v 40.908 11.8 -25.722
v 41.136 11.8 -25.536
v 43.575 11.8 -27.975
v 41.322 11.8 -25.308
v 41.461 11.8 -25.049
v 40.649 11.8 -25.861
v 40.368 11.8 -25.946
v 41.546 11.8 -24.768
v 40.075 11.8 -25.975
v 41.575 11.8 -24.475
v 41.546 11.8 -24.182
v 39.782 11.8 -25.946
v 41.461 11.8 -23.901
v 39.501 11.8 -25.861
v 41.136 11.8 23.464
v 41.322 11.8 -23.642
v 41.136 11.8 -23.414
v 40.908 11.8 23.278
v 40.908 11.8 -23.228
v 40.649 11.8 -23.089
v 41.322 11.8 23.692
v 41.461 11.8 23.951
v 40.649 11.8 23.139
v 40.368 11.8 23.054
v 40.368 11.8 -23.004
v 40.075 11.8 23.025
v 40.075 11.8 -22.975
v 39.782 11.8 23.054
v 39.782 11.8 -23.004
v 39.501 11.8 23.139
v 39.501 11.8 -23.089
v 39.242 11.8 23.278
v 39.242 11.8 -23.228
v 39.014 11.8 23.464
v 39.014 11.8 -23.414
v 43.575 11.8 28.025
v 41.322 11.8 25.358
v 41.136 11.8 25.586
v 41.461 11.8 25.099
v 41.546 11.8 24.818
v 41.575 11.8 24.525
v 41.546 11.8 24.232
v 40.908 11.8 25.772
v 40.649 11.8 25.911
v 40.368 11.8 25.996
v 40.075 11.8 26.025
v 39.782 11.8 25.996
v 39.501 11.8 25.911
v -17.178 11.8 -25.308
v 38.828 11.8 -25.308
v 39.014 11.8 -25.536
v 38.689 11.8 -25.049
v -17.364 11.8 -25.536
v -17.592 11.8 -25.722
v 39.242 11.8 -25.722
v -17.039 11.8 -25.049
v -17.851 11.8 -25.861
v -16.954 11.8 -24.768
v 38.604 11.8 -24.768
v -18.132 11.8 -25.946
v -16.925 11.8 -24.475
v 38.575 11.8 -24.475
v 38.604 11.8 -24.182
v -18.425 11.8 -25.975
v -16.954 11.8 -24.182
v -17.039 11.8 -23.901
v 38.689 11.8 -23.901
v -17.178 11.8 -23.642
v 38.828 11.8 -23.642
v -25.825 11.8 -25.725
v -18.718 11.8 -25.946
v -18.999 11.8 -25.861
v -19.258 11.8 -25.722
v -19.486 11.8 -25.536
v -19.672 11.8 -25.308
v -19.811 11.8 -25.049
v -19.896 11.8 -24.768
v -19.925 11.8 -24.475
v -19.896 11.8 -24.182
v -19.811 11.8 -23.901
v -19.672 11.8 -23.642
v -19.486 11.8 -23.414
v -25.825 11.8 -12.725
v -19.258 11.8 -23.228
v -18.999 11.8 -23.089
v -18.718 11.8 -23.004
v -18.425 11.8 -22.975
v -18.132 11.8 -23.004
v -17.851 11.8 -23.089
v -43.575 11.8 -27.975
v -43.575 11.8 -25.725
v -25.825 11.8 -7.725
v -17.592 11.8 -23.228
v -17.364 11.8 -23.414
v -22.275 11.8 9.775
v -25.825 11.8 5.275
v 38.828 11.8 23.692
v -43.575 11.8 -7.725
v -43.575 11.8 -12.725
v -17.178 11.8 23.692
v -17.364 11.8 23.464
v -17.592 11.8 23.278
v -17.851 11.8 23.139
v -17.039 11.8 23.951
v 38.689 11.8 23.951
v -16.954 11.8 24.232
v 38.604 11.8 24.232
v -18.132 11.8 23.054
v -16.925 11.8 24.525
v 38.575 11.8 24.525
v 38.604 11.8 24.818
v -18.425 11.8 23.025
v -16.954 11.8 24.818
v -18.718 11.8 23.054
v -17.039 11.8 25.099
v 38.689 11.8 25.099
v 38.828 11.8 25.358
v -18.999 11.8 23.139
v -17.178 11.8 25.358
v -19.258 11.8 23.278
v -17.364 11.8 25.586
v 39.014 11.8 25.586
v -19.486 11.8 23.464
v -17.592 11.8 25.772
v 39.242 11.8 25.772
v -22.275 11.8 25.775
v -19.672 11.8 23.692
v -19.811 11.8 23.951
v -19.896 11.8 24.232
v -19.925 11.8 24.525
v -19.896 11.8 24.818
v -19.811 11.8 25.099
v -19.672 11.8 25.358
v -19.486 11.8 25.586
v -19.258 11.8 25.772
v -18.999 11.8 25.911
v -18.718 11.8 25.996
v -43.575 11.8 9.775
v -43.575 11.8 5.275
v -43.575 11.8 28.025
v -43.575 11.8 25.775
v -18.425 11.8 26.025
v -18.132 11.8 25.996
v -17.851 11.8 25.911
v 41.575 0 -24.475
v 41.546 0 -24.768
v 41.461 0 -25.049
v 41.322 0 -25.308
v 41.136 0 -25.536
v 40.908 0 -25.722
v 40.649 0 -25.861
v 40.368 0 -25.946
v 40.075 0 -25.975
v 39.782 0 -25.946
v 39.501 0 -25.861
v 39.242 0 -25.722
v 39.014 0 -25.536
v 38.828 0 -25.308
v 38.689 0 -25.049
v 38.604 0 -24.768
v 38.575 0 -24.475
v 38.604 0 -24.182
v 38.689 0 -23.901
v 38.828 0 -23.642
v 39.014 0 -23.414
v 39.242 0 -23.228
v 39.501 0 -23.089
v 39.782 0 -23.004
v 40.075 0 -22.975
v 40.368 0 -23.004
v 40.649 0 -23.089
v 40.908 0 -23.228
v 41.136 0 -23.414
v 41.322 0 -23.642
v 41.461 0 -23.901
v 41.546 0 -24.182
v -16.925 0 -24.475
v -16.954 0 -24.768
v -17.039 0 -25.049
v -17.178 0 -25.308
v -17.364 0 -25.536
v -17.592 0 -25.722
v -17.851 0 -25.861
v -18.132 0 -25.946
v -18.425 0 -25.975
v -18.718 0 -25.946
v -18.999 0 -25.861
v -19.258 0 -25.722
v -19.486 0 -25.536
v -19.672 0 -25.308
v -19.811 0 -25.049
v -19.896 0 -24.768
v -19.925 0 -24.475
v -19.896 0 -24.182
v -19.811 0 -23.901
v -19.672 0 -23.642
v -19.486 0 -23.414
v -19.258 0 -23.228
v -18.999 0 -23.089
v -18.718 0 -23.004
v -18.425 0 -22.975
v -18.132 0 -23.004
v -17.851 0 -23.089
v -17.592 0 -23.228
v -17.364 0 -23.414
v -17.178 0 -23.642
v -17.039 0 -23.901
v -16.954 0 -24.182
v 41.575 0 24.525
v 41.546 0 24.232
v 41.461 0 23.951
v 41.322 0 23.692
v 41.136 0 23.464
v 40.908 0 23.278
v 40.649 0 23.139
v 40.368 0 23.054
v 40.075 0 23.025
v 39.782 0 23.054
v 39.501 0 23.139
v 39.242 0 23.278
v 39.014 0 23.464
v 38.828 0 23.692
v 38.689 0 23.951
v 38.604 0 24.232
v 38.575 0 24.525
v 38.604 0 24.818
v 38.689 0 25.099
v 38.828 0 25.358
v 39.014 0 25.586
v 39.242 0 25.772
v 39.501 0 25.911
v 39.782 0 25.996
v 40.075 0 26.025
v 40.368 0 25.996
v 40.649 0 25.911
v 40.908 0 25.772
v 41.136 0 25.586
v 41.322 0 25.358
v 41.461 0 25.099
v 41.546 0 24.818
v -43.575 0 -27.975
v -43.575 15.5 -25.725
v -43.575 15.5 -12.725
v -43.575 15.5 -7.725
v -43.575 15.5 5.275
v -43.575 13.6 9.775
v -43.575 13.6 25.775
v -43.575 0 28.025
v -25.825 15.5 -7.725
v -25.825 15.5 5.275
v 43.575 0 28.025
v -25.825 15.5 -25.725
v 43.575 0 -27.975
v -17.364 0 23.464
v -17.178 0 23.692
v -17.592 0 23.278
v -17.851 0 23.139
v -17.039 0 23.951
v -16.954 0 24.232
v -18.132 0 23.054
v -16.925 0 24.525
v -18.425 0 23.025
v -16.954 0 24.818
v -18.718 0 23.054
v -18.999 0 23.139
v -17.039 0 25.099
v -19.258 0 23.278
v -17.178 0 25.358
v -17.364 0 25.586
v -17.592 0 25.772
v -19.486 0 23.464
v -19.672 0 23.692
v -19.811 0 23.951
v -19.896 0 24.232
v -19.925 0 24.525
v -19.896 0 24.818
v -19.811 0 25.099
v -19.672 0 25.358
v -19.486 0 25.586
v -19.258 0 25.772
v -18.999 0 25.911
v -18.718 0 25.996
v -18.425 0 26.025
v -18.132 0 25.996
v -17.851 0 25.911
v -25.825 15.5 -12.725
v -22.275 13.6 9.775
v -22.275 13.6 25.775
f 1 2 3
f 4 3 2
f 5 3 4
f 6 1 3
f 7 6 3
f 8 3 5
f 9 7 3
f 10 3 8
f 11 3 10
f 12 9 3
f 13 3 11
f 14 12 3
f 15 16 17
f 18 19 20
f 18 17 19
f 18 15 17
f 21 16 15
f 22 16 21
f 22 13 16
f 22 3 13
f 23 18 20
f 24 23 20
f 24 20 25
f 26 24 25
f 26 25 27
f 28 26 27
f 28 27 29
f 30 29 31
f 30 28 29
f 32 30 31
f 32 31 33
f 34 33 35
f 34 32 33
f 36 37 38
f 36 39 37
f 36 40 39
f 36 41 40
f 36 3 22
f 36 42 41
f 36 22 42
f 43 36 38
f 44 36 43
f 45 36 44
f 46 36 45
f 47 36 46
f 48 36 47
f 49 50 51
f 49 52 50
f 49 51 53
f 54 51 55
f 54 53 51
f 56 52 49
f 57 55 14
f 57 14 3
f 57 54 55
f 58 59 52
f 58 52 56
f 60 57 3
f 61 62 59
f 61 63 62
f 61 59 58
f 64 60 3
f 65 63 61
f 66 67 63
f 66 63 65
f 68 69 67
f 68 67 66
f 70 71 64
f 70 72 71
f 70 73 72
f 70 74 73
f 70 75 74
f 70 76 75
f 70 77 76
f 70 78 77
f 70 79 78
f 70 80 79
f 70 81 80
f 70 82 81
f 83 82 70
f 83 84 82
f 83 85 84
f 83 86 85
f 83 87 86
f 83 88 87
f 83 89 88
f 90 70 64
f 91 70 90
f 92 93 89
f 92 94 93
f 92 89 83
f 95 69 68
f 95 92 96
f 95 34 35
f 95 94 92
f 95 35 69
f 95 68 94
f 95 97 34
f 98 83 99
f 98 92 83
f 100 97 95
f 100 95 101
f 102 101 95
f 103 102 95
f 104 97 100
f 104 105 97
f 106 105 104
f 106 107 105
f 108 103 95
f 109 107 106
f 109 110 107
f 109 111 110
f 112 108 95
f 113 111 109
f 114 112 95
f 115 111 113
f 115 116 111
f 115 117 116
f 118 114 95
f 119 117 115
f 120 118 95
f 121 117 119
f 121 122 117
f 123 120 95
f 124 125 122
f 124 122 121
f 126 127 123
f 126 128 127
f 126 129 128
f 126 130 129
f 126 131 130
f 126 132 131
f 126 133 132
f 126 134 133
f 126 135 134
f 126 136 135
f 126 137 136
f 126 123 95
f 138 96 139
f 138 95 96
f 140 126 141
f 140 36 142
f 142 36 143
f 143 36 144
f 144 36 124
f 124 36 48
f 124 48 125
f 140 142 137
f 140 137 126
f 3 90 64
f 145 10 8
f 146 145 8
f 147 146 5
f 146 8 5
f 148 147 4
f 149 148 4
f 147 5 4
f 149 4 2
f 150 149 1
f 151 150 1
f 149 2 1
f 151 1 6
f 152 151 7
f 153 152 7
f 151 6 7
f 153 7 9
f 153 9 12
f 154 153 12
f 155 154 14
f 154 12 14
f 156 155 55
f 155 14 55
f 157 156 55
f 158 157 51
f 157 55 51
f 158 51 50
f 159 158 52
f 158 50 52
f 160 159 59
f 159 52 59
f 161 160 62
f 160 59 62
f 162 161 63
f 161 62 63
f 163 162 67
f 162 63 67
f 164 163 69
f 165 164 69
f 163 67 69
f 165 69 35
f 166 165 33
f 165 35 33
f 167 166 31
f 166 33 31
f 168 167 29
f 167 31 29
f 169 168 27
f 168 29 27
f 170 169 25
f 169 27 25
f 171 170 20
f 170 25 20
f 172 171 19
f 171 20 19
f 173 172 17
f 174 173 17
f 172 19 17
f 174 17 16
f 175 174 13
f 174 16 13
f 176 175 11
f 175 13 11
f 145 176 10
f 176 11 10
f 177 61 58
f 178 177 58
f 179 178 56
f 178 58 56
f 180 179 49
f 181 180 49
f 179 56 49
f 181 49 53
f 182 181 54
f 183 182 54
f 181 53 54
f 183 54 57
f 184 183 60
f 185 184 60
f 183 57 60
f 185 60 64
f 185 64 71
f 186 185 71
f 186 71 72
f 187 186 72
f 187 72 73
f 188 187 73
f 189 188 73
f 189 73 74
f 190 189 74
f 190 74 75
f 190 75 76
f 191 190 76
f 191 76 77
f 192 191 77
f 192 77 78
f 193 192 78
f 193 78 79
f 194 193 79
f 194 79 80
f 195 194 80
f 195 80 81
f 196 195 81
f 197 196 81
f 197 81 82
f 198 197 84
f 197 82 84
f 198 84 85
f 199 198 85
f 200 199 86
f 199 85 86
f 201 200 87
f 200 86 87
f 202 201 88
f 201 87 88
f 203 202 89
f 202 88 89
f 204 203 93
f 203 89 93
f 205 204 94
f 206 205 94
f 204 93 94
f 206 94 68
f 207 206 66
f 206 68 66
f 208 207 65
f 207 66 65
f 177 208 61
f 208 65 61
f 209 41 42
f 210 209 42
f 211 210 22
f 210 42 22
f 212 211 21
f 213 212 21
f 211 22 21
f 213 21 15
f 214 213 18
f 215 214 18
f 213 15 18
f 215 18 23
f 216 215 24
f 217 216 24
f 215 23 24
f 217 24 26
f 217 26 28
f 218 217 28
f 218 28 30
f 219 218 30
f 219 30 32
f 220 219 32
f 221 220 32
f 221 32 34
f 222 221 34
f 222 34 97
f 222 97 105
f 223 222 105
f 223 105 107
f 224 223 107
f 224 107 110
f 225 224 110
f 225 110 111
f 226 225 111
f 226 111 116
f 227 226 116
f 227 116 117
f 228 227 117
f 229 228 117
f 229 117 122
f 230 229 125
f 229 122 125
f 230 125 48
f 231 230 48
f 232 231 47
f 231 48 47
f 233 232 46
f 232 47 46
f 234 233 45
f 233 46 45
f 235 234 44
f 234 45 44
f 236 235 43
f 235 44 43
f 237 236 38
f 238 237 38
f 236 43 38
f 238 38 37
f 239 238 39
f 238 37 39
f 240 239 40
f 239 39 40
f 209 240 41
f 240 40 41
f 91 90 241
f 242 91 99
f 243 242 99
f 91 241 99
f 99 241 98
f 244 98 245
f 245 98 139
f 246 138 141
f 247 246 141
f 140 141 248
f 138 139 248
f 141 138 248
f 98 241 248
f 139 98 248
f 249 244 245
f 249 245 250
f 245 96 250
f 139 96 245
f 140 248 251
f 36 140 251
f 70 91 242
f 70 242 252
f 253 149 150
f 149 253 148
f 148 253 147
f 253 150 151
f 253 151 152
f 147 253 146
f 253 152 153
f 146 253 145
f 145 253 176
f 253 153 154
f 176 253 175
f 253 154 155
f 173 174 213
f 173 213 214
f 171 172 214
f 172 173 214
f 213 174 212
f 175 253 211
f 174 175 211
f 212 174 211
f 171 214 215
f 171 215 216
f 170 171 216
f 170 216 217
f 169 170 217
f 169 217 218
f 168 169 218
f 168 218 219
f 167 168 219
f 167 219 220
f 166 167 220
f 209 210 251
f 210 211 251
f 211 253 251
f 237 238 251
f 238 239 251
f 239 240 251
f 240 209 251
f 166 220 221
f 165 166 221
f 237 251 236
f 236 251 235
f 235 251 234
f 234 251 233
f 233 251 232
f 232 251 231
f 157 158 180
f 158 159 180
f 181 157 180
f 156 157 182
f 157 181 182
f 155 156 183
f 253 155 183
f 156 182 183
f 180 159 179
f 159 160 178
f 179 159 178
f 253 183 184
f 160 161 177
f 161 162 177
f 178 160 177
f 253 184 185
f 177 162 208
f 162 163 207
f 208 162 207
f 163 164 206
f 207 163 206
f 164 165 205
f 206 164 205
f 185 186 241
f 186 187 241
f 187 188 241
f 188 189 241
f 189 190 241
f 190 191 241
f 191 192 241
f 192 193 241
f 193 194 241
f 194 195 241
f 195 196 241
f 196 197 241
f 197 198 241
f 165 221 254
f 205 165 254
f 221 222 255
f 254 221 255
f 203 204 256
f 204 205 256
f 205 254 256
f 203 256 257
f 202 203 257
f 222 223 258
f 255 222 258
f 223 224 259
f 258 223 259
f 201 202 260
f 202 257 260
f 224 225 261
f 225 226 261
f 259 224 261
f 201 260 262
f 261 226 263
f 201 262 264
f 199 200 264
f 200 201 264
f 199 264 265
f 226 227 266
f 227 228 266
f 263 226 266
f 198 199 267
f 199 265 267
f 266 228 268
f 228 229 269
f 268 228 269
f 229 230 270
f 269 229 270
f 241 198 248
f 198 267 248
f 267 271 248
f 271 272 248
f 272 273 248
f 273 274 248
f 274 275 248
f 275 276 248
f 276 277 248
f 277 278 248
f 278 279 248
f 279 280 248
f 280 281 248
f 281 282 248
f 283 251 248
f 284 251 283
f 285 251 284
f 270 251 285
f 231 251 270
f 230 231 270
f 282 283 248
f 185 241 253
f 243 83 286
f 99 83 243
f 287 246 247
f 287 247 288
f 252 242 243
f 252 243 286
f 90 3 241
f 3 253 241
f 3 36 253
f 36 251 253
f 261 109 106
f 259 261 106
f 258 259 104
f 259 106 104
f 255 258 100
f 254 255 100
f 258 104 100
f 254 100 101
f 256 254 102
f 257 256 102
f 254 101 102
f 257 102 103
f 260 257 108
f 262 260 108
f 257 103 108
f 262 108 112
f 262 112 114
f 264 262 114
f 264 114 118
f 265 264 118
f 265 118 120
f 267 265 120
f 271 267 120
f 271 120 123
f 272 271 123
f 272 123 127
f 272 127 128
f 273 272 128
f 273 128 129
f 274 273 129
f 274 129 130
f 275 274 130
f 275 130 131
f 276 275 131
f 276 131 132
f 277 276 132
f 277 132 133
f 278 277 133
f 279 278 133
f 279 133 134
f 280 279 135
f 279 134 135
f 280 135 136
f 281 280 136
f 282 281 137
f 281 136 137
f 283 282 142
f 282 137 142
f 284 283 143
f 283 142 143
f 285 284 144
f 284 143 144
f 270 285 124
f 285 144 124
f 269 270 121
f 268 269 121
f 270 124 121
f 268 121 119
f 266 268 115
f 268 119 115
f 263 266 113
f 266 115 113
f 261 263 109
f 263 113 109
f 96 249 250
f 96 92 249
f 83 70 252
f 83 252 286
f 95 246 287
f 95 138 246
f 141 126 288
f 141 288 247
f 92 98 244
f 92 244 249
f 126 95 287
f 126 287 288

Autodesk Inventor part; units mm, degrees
ref_plane "YZ Plane" through (0, 0, 0) normal (1, 0, 0) x (0, 1, 0)
ref_plane "XZ Plane" through (0, 0, 0) normal (0, 1, 0) x (-1, 0, 0)
ref_plane "XY Plane" through (0, 0, 0) normal (0, 0, 1) x (1, 0, 0)
sketch "Sketch1" plane through (0, 0, 0) normal (0, 1, 0) x (-1, 0, 0)
  line L0 (43.575, 28.025) -> (-43.575, 28.025)
  line L1 (-43.575, 28.025) -> (-43.575, -27.975)
  line L2 (-43.575, -27.975) -> (43.575, -27.975)
  line L3 (43.575, -27.975) -> (43.575, 28.025)
  point P0 (0, 0)
  dimension "d0" = 87.15
  dimension "d1" = 56
  dimension "d2" = 27.975
  dimension "d3" = 43.575
extrude "Extrusion1" add sketch "Sketch1" along normal blind 11.8
sketch "Sketch4" plane through (0, 11.8, 0) normal (0, 1, 0) x (1, 0, 0)
  line L0 (-43.575, 25.725) -> (-25.825, 25.725)
  line L1 (-25.825, 25.725) -> (-25.825, 12.725)
  line L2 (-25.825, 12.725) -> (-43.575, 12.725)
  line L3 (-43.575, 12.725) -> (-43.575, 25.725)
  line L4 (-43.575, 7.725) -> (-25.825, 7.725)
  line L5 (-25.825, 7.725) -> (-25.825, -5.275)
  line L6 (-25.825, -5.275) -> (-43.575, -5.275)
  line L7 (-43.575, -5.275) -> (-43.575, 7.725)
  line L8 (43.575, 27.975) -> (-43.575, 27.975) projected
  line L9 (-43.575, 27.975) -> (-43.575, -28.025) projected
  point P0 (0, 0)
  dimension "d12" = 17.75
  dimension "d13" = 13
  dimension "d14" = 5
  dimension "d15" = 13
  dimension "d16" = 17.75
  dimension "d43" = 2.25
extrude "Extrusion2" add sketch "Sketch4" along normal blind 3.7
sketch "Sketch6" plane through (0, 11.8, 0) normal (0, 1, 0) x (1, 0, 0)
  line L0 (-43.575, -9.775) -> (-22.275, -9.775)
  line L1 (-22.275, -9.775) -> (-22.275, -25.775)
  line L2 (-22.275, -25.775) -> (-43.575, -25.775)
  line L3 (-43.575, -25.775) -> (-43.575, -9.775)
  line L4 (-43.575, 25.725) -> (-25.825, 25.725) projected
  line L5 (-43.575, 27.975) -> (-43.575, 25.725) projected
  line L6 (-43.575, -5.275) -> (-25.825, -5.275) projected
  point P0 (0, 0)
  dimension "d19" = 16
  dimension "d20" = 21.3
  dimension "d22" = 0
  dimension "d44" = 4.5
extrude "Extrusion3" add sketch "Sketch6" along normal blind 1.8
sketch "Sketch10" plane through (43.575, 0, 28.025) normal (1, 0, 0) x (0, 0, -1)
  point P0 (28.025, 0)
sketch "Sketch11" plane through (0, 11.8, 0) normal (0, 1, 0) x (1, 0, 0)
  circle A0 centre (-18.425, -24.525) radius 1.5
  circle A1 centre (-18.425, 24.475) radius 1.5
  circle A2 centre (40.075, -24.525) radius 1.5
  circle A3 centre (40.075, 24.475) radius 1.5
  line L0 (-43.575, -5.275) -> (-43.575, -9.775) projected
  line L1 (-43.575, 27.975) -> (-43.575, 25.725) projected
  line L2 (-43.575, -28.025) -> (43.575, -28.025) projected
  line L3 (43.575, -28.025) -> (43.575, 27.975) projected
  line L4 (43.575, 27.975) -> (-43.575, 27.975) projected
  point P0 (0, 0)
  dimension "d45" = 3
  dimension "d46" = 3
  dimension "d47" = 3
  dimension "d48" = 3
  dimension "d50" = 58.5
  dimension "d51" = 58.5
  dimension "d55" = 3.5
  dimension "d56" = 3.5
  dimension "d59" = 3.5
  dimension "d60" = 3.5
  dimension "d61" = 3.5
  dimension "d62" = 3.5
extrude "Extrusion7" cut sketch "Sketch11" against normal through all
properties part number "RaspPi_Model"
